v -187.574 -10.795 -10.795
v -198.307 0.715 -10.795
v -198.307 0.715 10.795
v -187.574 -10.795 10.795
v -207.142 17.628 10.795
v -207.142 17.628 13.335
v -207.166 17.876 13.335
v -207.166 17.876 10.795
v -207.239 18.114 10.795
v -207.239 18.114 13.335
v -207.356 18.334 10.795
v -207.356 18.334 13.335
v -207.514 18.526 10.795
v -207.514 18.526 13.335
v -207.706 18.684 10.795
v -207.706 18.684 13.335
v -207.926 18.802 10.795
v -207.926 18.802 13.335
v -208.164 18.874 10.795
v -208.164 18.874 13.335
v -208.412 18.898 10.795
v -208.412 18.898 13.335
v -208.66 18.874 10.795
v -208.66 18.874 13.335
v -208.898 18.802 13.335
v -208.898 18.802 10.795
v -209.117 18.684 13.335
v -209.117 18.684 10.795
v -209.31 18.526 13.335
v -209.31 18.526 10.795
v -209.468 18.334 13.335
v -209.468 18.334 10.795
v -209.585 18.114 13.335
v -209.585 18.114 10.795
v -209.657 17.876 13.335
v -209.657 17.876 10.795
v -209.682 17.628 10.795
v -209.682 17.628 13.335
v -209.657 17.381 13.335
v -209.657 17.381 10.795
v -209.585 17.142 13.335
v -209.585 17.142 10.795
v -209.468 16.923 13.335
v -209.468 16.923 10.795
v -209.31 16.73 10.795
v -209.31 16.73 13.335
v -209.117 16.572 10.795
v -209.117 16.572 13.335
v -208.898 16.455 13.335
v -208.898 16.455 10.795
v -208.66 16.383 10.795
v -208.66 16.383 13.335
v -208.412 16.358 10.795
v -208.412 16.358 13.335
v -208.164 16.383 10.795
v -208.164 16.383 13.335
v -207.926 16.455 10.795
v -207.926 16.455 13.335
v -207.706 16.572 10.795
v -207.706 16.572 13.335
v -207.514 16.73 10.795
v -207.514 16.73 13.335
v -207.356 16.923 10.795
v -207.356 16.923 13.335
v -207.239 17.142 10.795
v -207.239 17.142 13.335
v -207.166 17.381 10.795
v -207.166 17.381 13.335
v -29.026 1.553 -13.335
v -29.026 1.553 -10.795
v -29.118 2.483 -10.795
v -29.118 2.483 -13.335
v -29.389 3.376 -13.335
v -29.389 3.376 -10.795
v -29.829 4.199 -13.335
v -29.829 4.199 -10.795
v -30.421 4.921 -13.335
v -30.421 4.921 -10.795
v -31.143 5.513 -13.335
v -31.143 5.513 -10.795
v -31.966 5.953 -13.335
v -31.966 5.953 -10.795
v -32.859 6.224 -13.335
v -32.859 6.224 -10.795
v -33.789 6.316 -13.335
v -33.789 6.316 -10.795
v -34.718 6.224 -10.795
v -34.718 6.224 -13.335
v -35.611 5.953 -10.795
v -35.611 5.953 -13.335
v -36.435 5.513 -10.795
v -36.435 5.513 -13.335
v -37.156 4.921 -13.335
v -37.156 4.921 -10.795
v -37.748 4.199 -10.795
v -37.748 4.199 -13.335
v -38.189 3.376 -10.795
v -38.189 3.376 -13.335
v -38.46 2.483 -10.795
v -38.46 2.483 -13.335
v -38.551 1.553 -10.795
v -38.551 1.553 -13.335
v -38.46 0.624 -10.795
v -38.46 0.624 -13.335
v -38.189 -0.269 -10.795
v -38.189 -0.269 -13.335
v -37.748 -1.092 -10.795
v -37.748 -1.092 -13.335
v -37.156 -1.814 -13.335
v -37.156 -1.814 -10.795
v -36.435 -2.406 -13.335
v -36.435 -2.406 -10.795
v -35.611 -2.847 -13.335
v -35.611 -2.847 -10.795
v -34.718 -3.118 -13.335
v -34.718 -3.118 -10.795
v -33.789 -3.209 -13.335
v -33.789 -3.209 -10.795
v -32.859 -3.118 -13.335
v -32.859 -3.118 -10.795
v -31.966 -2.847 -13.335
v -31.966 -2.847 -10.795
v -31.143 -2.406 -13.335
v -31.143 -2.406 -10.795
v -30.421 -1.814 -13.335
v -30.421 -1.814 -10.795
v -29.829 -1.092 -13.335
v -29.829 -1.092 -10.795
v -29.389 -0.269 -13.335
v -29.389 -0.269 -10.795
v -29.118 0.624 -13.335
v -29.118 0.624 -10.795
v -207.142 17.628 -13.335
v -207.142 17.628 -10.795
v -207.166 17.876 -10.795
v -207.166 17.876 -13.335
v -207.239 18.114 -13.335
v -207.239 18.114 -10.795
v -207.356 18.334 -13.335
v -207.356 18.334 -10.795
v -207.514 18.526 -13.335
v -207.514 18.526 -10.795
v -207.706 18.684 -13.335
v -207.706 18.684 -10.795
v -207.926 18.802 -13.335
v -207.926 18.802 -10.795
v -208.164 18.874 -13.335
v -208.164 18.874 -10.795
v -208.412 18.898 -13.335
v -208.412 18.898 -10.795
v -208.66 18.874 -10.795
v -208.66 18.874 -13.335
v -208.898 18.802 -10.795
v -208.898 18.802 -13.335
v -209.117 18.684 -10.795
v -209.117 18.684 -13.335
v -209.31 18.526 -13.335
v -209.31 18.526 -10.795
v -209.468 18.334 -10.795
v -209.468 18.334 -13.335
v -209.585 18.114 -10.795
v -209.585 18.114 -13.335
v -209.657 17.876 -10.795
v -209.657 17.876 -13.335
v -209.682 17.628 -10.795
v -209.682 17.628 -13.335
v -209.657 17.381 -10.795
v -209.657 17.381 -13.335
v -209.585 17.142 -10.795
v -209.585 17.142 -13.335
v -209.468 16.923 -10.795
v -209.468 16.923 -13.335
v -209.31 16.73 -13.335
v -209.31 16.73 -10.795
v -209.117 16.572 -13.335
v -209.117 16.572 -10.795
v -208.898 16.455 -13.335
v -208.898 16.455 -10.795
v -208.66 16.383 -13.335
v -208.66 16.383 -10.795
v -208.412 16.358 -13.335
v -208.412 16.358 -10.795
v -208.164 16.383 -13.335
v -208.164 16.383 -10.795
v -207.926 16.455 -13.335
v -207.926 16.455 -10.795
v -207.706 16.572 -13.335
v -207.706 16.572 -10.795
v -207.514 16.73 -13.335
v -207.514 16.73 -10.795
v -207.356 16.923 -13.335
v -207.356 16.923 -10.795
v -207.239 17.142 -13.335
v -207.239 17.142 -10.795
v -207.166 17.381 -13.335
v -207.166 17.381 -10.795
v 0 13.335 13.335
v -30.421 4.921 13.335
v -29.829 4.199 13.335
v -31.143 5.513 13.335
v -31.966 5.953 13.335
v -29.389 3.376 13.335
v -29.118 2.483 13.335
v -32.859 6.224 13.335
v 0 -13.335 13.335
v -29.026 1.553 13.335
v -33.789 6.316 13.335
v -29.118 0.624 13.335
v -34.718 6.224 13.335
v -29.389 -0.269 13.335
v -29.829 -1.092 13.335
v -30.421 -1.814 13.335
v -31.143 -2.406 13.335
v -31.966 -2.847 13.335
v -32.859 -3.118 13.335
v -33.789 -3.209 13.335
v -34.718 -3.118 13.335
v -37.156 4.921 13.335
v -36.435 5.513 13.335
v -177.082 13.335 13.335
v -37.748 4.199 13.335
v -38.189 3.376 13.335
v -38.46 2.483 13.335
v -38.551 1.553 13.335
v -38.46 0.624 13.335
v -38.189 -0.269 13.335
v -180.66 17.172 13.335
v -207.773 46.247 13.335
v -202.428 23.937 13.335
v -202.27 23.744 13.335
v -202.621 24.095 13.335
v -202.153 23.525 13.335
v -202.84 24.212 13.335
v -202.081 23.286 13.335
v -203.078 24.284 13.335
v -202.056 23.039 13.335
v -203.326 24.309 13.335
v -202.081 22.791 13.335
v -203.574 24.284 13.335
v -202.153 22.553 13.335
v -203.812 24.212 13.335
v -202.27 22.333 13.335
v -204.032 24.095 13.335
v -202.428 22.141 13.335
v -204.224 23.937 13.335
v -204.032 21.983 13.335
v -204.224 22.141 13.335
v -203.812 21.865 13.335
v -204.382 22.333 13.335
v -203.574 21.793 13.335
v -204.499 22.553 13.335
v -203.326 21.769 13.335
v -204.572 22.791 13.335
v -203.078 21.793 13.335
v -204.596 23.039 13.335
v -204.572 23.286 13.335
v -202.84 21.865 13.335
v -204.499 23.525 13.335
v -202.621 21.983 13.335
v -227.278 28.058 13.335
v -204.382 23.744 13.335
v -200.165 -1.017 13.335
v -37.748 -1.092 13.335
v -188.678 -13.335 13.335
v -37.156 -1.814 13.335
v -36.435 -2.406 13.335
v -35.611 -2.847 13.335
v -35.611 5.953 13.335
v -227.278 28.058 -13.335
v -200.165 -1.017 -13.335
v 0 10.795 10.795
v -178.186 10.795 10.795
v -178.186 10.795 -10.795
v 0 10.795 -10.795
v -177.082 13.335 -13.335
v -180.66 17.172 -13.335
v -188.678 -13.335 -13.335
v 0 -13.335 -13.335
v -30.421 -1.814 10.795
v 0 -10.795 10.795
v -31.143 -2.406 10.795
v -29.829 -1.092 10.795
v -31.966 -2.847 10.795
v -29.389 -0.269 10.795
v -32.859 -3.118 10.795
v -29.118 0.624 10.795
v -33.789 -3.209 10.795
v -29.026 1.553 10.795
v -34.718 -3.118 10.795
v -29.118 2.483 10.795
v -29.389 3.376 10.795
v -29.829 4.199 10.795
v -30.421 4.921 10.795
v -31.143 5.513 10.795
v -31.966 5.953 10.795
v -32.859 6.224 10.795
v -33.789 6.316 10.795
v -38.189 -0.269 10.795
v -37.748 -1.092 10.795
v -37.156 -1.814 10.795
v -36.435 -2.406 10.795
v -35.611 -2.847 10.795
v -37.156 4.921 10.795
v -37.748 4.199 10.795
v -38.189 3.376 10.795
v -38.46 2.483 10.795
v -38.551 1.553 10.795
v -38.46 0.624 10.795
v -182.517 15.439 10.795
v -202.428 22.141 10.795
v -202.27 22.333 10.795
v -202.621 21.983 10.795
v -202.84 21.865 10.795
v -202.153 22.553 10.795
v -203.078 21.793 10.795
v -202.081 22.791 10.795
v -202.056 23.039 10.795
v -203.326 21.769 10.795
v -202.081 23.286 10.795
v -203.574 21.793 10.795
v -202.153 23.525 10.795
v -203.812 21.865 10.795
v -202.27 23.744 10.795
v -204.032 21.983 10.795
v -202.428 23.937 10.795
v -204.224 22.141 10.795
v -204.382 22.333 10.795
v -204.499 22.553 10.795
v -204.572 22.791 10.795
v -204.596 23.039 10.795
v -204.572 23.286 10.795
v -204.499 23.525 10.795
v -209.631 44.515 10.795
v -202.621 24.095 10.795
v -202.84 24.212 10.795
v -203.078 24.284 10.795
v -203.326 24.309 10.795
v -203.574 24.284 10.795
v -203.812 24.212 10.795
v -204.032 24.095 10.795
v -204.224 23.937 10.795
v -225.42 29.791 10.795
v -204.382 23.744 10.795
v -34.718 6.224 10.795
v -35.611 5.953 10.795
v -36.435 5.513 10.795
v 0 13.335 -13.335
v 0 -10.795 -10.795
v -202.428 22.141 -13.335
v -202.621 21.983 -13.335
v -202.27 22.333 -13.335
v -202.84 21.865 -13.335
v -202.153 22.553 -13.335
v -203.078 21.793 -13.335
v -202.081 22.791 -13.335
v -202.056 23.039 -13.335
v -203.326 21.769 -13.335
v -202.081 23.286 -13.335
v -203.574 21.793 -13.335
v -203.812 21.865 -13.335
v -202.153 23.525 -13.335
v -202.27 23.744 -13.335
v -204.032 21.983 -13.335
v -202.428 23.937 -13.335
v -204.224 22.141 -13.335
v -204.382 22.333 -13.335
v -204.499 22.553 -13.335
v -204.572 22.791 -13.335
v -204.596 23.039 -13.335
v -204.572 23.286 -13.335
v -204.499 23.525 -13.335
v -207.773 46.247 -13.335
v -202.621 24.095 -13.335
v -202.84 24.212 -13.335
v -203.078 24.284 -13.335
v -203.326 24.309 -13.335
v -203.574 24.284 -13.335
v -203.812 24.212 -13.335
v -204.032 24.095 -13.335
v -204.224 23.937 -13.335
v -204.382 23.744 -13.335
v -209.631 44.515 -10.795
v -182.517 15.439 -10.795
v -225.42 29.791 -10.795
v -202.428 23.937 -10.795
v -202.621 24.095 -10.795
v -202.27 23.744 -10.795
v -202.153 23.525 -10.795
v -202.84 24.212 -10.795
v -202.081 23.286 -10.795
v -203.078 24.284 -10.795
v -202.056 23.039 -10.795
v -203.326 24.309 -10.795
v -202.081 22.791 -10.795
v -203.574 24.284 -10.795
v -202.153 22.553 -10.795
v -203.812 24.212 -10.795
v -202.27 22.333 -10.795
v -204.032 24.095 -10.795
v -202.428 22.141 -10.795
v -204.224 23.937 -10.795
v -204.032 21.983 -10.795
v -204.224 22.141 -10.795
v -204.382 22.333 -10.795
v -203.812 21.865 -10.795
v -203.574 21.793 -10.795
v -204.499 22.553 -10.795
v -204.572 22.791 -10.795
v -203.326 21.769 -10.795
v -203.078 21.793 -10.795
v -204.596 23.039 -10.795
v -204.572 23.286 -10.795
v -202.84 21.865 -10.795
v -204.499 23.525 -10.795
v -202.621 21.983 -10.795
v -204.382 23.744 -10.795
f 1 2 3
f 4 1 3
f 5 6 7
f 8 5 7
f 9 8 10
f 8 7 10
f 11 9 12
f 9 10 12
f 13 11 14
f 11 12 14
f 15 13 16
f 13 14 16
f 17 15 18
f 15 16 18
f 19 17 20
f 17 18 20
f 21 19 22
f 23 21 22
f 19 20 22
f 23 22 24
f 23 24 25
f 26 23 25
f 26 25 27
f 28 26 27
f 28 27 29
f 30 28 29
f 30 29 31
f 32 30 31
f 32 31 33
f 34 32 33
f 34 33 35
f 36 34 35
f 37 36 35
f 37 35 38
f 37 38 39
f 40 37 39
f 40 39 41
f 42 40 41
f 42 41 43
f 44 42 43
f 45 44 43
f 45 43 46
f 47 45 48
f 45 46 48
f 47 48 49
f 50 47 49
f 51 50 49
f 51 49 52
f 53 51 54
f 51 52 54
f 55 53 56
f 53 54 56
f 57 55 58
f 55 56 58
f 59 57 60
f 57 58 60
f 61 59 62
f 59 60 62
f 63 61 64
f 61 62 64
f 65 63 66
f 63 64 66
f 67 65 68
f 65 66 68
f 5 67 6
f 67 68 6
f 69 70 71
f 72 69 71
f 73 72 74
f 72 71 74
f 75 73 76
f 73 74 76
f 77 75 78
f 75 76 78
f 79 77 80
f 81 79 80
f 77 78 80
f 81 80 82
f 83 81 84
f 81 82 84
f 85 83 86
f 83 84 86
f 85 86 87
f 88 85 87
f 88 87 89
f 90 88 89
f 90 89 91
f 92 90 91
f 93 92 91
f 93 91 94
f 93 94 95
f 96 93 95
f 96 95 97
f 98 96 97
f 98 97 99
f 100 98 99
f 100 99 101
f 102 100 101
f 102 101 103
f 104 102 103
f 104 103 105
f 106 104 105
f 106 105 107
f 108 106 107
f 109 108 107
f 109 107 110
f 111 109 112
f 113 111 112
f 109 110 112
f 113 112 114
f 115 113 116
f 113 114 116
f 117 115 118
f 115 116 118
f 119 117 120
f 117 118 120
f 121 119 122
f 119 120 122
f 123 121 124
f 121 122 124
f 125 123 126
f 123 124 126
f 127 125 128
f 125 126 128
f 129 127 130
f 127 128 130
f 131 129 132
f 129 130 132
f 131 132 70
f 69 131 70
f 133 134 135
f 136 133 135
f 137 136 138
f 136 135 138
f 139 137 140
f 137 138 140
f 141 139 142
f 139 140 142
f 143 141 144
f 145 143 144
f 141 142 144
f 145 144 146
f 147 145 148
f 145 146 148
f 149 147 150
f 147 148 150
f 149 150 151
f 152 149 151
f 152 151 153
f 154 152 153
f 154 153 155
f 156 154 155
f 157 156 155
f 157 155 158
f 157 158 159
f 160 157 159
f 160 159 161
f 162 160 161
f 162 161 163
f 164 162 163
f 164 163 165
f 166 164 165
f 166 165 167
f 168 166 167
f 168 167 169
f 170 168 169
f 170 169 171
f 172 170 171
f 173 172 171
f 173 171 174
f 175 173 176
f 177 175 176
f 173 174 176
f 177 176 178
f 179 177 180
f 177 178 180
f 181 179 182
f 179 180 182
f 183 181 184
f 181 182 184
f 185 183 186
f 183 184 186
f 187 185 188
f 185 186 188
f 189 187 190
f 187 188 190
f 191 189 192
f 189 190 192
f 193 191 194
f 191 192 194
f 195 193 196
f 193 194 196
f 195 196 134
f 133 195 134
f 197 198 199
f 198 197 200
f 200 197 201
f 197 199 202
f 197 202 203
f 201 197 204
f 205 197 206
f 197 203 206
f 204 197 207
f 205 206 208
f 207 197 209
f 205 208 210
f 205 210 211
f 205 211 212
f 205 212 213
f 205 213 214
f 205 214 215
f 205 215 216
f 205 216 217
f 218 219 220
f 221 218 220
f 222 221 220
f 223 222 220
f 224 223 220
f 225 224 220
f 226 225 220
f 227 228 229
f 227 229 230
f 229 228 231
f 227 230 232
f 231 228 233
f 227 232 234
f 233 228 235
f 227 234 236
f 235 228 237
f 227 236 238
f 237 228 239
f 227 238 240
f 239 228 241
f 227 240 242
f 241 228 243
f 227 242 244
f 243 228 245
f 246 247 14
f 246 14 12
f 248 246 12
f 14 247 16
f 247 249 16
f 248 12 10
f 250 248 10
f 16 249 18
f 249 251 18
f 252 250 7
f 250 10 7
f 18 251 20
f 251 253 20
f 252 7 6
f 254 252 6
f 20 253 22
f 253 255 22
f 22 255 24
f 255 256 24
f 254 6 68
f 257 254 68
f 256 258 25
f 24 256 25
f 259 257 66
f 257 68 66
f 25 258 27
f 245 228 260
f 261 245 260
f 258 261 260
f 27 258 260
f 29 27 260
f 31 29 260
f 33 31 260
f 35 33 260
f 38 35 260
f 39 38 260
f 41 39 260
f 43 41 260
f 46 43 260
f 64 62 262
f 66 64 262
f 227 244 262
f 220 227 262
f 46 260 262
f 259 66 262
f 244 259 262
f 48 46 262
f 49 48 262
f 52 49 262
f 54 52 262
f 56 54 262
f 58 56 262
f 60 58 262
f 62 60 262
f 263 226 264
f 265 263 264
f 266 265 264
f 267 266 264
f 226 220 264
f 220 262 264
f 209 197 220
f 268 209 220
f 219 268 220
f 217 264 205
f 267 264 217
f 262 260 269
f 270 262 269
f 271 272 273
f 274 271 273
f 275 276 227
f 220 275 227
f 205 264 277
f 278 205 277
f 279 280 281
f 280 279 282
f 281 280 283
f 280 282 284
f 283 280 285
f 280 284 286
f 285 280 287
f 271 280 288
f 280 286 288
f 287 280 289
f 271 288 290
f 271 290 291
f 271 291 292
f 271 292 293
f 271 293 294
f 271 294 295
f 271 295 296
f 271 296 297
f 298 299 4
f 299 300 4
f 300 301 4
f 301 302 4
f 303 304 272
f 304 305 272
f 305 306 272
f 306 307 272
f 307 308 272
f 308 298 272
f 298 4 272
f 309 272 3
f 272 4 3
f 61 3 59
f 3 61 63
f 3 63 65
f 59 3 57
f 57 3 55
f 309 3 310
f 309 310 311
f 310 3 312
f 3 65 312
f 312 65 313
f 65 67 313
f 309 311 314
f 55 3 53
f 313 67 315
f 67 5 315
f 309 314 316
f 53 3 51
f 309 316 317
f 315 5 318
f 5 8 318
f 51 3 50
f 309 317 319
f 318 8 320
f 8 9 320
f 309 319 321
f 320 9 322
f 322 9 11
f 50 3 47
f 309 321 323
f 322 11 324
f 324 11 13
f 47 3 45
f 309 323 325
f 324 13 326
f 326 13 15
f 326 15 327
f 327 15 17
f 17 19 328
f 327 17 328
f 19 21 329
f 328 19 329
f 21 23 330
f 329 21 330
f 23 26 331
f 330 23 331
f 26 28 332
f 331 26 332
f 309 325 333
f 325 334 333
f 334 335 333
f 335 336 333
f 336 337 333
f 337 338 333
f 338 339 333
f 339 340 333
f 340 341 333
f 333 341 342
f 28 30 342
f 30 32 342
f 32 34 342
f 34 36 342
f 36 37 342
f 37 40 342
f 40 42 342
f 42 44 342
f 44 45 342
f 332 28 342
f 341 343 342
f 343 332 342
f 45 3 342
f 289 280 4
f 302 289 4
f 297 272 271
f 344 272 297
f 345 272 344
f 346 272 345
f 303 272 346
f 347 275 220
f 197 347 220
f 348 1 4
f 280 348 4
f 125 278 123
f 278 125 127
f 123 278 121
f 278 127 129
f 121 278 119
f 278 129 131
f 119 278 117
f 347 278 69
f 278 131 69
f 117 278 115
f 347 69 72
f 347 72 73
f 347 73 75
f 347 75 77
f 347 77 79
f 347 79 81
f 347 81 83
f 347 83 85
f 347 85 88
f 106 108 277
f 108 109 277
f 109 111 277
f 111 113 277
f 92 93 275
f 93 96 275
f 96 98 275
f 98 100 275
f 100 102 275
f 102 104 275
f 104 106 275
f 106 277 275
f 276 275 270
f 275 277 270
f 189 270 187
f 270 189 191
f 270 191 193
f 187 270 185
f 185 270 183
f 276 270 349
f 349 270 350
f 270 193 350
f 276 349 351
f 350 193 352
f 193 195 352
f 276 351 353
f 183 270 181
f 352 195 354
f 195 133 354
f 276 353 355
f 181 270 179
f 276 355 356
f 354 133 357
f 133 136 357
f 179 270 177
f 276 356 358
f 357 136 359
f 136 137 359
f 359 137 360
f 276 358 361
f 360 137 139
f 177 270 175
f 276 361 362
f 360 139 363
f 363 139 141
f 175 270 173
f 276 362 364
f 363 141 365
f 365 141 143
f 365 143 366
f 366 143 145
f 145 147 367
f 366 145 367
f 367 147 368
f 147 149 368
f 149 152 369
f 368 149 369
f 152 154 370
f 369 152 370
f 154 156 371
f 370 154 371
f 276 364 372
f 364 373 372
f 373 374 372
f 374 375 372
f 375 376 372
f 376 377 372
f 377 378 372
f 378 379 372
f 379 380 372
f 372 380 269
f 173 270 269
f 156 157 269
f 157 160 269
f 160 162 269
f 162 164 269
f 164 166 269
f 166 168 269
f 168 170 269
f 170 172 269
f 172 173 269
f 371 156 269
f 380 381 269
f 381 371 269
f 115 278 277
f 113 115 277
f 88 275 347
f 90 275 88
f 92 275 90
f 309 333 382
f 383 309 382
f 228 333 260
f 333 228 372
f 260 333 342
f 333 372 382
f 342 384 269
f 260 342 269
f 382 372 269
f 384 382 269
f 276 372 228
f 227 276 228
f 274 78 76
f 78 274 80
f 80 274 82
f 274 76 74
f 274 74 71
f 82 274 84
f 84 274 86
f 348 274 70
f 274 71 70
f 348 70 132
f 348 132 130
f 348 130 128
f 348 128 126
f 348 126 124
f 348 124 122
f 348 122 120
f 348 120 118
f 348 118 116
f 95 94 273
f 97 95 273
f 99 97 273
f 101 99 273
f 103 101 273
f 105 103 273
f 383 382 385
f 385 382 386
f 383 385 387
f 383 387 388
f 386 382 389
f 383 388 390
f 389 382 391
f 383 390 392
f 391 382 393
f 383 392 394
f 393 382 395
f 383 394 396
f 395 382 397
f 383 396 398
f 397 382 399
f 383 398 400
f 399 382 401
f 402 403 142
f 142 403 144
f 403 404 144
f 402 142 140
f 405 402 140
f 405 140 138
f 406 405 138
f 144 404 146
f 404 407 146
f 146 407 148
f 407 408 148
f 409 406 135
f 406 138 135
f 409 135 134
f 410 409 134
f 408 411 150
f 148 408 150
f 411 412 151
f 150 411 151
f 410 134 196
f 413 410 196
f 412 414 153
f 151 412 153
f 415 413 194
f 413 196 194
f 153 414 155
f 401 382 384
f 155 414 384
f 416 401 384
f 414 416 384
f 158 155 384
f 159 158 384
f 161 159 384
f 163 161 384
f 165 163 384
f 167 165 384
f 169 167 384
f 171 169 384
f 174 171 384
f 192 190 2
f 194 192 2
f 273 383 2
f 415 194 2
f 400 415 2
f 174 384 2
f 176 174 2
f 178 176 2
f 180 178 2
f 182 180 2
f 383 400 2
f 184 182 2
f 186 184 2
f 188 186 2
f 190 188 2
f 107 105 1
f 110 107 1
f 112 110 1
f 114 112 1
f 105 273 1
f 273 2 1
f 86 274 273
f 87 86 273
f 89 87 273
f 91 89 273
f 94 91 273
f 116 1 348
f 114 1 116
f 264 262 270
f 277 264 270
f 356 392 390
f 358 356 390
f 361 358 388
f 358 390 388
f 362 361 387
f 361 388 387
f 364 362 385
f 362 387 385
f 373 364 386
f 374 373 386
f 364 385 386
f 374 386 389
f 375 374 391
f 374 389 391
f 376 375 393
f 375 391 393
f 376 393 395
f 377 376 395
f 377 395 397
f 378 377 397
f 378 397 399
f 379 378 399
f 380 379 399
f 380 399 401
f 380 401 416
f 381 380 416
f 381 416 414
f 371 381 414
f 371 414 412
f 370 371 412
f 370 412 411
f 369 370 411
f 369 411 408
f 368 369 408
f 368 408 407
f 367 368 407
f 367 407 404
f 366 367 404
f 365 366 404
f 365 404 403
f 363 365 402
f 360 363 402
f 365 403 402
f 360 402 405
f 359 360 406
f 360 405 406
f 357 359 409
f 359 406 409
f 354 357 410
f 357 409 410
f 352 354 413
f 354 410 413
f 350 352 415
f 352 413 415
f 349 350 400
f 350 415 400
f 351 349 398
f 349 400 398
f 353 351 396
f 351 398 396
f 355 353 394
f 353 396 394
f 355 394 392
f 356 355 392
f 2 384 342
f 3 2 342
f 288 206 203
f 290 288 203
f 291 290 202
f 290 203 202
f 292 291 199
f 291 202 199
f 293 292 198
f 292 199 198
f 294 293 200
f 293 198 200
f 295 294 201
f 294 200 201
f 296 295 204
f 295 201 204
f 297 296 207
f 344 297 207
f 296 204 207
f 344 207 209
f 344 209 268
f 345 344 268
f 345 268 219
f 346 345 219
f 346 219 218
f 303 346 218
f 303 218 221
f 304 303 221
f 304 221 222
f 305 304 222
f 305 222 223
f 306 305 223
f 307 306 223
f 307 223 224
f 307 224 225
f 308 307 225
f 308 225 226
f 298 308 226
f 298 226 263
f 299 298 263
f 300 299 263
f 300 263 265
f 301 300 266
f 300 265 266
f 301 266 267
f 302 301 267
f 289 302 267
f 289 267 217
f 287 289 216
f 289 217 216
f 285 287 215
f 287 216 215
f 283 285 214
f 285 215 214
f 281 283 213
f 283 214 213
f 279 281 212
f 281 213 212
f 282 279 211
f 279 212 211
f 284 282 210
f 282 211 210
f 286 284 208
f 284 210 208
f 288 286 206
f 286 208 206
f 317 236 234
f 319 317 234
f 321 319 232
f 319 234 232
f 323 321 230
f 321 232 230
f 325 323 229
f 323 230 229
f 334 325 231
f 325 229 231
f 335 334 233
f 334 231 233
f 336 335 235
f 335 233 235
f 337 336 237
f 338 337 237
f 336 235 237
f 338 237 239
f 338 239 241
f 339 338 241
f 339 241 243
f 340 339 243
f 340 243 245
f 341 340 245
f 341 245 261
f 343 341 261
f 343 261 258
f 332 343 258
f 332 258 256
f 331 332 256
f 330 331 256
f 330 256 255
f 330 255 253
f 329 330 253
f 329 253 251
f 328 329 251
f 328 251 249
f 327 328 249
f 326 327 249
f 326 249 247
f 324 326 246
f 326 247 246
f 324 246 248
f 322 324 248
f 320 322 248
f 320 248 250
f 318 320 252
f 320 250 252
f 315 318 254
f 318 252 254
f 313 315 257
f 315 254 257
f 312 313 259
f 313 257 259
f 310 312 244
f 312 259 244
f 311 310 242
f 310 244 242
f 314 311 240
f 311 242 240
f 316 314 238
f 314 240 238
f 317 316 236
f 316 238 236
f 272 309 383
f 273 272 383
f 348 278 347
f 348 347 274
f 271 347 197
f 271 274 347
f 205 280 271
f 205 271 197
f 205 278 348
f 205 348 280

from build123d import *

# Parameters (mm, degrees)
SKETCH2_W          = 26.67
SKETCH2_H          = 26.67
SKETCH2_W_2        = 21.59
SKETCH2_H_2        = 21.59
SKETCH4_R          = 4.7625
CUT_EXTRUDE2_DEPTH = 234.463995003
SKETCH5_R          = 1.27
CUT_EXTRUDE3_DEPTH = 234.463995003


with BuildPart() as part:
    # Sweep1: sweep along a path in Sketch1
    with BuildLine(Plane.XY) as sweep1_path:
        Line((0, 0), (-171.835765676, 0))
        Line((-171.835765676, 0), (-182.88, 0))
        Line((-182.88, 0), (-190.412149697, 8.077241654))
        Line((-190.412149697, 8.077241654), (-217.525516691, 37.152768042))
    # Sketch2 → Sweep1 (sweep)
    with BuildSketch(Plane(origin=(0, 0, 0), x_dir=(0, 0, -1), z_dir=(1, 0, 0))):
        Rectangle(SKETCH2_W, SKETCH2_H)
        Rectangle(SKETCH2_W_2, SKETCH2_H_2, mode=Mode.SUBTRACT)
    sweep(path=sweep1_path.line, transition=Transition.RIGHT)

    # Sketch4 → Cut-Extrude2 (cut, through all)
    with BuildSketch(Plane.XY.offset(13.335)):
        with Locations((-33.788615372, 1.553440166)):
            Circle(SKETCH4_R)
    extrude(amount=-CUT_EXTRUDE2_DEPTH, mode=Mode.SUBTRACT)

    # Sketch5 → Cut-Extrude3 (cut, through all)
    with BuildSketch(Plane.XY.offset(13.335)):
        with Locations((-203.326149514, 23.038600359)):
            Circle(SKETCH5_R)
        with Locations((-208.411861608, 17.628386689)):
            Circle(SKETCH5_R)
    extrude(amount=-CUT_EXTRUDE3_DEPTH, mode=Mode.SUBTRACT)


solid = part.part
